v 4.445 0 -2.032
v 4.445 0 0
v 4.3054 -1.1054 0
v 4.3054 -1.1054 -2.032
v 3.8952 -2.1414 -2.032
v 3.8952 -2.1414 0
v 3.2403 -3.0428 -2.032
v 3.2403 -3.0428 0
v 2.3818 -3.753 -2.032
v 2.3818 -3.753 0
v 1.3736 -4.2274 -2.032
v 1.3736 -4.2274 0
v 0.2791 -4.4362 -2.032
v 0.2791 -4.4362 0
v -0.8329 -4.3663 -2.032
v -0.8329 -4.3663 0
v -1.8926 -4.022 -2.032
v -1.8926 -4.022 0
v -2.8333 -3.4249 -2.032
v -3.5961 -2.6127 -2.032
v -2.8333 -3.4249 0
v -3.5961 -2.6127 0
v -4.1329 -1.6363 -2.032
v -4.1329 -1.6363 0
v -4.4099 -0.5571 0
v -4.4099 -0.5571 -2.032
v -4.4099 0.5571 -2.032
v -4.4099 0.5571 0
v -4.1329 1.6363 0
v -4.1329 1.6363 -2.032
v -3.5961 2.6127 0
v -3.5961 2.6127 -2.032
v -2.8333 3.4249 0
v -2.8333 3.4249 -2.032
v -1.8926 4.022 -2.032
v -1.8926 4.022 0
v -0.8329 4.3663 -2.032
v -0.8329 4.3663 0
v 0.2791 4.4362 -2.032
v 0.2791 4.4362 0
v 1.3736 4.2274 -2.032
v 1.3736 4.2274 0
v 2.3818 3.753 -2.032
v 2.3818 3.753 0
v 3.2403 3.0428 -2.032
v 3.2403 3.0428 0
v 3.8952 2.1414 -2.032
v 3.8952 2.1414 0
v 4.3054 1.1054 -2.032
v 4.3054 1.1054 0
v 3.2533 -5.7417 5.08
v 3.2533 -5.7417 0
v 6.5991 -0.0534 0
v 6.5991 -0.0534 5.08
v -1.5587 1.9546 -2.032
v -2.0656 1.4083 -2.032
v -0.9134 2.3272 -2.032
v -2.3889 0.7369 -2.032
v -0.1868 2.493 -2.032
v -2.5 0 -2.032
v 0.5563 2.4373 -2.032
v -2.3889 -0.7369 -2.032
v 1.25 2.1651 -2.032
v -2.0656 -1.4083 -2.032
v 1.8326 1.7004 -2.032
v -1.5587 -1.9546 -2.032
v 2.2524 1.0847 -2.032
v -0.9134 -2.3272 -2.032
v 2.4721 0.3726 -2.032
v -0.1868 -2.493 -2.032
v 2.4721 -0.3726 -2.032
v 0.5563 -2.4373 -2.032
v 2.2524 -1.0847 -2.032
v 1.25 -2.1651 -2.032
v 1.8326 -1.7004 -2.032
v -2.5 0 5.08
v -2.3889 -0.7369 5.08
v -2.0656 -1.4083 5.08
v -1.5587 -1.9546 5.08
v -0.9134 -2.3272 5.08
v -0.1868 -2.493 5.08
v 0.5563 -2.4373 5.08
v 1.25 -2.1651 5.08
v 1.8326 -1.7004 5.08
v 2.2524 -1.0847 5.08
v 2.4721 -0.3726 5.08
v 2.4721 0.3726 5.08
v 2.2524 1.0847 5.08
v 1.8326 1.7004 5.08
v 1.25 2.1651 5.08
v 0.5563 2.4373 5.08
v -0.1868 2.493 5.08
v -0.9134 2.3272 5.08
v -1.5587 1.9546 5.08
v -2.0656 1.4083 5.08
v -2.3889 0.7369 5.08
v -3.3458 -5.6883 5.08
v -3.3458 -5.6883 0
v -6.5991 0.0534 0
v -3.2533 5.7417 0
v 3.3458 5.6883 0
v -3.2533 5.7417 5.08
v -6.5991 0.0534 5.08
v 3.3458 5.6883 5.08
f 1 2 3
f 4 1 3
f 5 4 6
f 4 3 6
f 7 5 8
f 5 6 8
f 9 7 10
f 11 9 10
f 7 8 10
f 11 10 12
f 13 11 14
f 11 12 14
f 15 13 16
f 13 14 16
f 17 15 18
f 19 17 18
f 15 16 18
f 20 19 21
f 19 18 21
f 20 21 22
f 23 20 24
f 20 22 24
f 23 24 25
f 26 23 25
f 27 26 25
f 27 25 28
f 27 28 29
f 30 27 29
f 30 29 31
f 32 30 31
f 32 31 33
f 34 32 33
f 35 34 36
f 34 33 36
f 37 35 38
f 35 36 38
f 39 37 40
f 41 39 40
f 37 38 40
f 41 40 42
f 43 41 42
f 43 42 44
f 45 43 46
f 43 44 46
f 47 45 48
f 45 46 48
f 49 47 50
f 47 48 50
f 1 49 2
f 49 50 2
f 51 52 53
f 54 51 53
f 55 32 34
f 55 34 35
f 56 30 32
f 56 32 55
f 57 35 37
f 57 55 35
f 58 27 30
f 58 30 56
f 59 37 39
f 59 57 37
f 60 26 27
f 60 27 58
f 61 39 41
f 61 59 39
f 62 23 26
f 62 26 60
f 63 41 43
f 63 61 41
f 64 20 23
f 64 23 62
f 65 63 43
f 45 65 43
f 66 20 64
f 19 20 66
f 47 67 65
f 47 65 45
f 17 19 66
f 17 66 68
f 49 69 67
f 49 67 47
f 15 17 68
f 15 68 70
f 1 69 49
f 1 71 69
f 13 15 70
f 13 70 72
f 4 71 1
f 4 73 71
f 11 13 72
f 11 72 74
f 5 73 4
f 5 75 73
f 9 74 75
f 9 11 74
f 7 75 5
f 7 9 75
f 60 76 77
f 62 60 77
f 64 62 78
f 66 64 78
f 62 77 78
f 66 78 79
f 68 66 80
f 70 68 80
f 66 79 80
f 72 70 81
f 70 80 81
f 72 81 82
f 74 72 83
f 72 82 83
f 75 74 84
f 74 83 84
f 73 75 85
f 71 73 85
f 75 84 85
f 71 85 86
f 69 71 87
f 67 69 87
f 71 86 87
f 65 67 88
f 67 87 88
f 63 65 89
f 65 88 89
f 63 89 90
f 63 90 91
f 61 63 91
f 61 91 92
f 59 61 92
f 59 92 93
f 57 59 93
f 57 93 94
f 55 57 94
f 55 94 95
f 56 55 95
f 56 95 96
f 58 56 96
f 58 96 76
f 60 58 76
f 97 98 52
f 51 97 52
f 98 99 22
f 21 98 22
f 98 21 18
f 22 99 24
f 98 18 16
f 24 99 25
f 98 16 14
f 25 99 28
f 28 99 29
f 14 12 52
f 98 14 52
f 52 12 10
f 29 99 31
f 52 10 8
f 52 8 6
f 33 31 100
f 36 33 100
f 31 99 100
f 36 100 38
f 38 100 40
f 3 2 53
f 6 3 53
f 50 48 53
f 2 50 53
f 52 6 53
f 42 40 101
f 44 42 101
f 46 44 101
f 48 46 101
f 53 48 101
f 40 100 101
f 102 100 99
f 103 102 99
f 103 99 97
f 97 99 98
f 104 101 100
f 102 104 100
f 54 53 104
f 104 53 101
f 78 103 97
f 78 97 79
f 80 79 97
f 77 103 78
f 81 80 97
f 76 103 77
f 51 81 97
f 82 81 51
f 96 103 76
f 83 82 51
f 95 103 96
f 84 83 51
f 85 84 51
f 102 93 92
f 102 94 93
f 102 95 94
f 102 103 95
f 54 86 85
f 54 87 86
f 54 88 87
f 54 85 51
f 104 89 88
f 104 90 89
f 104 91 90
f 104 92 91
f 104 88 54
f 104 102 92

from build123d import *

# Parameters (mm, degrees)
F1_DEPTH = 5.08
F2_R     = 4.445
F3_DEPTH = 2.032
F5_D     = 5


with BuildPart() as f1:
    # F0 (on Top) → F1 (new body)
    with BuildSketch(Plane.XY):
        Polygon((3.3457980823, 5.6883025765), (-3.2533154946, 5.7416974235), (-6.5991135768, 0.0533948469), (-3.3457980823, -5.6883025765), (3.2533154946, -5.7416974235), (6.5991135768, -0.0533948469), align=None)
    extrude(amount=F1_DEPTH)

    # F2 (on face) → F3 (join)
    with BuildSketch(Plane(origin=(0, 0, 0), x_dir=(1, 0, 0), z_dir=(0, 0, -1))):
        Circle(F2_R)
    extrude(amount=F3_DEPTH)

    # F5 (through all)
    with Locations(Plane(origin=(0, 0, -2.032), x_dir=(1, 0, 0), z_dir=(0, 0, -1))):
        with Locations((0, 0)):
            Hole(F5_D / 2)


solid = f1.part
